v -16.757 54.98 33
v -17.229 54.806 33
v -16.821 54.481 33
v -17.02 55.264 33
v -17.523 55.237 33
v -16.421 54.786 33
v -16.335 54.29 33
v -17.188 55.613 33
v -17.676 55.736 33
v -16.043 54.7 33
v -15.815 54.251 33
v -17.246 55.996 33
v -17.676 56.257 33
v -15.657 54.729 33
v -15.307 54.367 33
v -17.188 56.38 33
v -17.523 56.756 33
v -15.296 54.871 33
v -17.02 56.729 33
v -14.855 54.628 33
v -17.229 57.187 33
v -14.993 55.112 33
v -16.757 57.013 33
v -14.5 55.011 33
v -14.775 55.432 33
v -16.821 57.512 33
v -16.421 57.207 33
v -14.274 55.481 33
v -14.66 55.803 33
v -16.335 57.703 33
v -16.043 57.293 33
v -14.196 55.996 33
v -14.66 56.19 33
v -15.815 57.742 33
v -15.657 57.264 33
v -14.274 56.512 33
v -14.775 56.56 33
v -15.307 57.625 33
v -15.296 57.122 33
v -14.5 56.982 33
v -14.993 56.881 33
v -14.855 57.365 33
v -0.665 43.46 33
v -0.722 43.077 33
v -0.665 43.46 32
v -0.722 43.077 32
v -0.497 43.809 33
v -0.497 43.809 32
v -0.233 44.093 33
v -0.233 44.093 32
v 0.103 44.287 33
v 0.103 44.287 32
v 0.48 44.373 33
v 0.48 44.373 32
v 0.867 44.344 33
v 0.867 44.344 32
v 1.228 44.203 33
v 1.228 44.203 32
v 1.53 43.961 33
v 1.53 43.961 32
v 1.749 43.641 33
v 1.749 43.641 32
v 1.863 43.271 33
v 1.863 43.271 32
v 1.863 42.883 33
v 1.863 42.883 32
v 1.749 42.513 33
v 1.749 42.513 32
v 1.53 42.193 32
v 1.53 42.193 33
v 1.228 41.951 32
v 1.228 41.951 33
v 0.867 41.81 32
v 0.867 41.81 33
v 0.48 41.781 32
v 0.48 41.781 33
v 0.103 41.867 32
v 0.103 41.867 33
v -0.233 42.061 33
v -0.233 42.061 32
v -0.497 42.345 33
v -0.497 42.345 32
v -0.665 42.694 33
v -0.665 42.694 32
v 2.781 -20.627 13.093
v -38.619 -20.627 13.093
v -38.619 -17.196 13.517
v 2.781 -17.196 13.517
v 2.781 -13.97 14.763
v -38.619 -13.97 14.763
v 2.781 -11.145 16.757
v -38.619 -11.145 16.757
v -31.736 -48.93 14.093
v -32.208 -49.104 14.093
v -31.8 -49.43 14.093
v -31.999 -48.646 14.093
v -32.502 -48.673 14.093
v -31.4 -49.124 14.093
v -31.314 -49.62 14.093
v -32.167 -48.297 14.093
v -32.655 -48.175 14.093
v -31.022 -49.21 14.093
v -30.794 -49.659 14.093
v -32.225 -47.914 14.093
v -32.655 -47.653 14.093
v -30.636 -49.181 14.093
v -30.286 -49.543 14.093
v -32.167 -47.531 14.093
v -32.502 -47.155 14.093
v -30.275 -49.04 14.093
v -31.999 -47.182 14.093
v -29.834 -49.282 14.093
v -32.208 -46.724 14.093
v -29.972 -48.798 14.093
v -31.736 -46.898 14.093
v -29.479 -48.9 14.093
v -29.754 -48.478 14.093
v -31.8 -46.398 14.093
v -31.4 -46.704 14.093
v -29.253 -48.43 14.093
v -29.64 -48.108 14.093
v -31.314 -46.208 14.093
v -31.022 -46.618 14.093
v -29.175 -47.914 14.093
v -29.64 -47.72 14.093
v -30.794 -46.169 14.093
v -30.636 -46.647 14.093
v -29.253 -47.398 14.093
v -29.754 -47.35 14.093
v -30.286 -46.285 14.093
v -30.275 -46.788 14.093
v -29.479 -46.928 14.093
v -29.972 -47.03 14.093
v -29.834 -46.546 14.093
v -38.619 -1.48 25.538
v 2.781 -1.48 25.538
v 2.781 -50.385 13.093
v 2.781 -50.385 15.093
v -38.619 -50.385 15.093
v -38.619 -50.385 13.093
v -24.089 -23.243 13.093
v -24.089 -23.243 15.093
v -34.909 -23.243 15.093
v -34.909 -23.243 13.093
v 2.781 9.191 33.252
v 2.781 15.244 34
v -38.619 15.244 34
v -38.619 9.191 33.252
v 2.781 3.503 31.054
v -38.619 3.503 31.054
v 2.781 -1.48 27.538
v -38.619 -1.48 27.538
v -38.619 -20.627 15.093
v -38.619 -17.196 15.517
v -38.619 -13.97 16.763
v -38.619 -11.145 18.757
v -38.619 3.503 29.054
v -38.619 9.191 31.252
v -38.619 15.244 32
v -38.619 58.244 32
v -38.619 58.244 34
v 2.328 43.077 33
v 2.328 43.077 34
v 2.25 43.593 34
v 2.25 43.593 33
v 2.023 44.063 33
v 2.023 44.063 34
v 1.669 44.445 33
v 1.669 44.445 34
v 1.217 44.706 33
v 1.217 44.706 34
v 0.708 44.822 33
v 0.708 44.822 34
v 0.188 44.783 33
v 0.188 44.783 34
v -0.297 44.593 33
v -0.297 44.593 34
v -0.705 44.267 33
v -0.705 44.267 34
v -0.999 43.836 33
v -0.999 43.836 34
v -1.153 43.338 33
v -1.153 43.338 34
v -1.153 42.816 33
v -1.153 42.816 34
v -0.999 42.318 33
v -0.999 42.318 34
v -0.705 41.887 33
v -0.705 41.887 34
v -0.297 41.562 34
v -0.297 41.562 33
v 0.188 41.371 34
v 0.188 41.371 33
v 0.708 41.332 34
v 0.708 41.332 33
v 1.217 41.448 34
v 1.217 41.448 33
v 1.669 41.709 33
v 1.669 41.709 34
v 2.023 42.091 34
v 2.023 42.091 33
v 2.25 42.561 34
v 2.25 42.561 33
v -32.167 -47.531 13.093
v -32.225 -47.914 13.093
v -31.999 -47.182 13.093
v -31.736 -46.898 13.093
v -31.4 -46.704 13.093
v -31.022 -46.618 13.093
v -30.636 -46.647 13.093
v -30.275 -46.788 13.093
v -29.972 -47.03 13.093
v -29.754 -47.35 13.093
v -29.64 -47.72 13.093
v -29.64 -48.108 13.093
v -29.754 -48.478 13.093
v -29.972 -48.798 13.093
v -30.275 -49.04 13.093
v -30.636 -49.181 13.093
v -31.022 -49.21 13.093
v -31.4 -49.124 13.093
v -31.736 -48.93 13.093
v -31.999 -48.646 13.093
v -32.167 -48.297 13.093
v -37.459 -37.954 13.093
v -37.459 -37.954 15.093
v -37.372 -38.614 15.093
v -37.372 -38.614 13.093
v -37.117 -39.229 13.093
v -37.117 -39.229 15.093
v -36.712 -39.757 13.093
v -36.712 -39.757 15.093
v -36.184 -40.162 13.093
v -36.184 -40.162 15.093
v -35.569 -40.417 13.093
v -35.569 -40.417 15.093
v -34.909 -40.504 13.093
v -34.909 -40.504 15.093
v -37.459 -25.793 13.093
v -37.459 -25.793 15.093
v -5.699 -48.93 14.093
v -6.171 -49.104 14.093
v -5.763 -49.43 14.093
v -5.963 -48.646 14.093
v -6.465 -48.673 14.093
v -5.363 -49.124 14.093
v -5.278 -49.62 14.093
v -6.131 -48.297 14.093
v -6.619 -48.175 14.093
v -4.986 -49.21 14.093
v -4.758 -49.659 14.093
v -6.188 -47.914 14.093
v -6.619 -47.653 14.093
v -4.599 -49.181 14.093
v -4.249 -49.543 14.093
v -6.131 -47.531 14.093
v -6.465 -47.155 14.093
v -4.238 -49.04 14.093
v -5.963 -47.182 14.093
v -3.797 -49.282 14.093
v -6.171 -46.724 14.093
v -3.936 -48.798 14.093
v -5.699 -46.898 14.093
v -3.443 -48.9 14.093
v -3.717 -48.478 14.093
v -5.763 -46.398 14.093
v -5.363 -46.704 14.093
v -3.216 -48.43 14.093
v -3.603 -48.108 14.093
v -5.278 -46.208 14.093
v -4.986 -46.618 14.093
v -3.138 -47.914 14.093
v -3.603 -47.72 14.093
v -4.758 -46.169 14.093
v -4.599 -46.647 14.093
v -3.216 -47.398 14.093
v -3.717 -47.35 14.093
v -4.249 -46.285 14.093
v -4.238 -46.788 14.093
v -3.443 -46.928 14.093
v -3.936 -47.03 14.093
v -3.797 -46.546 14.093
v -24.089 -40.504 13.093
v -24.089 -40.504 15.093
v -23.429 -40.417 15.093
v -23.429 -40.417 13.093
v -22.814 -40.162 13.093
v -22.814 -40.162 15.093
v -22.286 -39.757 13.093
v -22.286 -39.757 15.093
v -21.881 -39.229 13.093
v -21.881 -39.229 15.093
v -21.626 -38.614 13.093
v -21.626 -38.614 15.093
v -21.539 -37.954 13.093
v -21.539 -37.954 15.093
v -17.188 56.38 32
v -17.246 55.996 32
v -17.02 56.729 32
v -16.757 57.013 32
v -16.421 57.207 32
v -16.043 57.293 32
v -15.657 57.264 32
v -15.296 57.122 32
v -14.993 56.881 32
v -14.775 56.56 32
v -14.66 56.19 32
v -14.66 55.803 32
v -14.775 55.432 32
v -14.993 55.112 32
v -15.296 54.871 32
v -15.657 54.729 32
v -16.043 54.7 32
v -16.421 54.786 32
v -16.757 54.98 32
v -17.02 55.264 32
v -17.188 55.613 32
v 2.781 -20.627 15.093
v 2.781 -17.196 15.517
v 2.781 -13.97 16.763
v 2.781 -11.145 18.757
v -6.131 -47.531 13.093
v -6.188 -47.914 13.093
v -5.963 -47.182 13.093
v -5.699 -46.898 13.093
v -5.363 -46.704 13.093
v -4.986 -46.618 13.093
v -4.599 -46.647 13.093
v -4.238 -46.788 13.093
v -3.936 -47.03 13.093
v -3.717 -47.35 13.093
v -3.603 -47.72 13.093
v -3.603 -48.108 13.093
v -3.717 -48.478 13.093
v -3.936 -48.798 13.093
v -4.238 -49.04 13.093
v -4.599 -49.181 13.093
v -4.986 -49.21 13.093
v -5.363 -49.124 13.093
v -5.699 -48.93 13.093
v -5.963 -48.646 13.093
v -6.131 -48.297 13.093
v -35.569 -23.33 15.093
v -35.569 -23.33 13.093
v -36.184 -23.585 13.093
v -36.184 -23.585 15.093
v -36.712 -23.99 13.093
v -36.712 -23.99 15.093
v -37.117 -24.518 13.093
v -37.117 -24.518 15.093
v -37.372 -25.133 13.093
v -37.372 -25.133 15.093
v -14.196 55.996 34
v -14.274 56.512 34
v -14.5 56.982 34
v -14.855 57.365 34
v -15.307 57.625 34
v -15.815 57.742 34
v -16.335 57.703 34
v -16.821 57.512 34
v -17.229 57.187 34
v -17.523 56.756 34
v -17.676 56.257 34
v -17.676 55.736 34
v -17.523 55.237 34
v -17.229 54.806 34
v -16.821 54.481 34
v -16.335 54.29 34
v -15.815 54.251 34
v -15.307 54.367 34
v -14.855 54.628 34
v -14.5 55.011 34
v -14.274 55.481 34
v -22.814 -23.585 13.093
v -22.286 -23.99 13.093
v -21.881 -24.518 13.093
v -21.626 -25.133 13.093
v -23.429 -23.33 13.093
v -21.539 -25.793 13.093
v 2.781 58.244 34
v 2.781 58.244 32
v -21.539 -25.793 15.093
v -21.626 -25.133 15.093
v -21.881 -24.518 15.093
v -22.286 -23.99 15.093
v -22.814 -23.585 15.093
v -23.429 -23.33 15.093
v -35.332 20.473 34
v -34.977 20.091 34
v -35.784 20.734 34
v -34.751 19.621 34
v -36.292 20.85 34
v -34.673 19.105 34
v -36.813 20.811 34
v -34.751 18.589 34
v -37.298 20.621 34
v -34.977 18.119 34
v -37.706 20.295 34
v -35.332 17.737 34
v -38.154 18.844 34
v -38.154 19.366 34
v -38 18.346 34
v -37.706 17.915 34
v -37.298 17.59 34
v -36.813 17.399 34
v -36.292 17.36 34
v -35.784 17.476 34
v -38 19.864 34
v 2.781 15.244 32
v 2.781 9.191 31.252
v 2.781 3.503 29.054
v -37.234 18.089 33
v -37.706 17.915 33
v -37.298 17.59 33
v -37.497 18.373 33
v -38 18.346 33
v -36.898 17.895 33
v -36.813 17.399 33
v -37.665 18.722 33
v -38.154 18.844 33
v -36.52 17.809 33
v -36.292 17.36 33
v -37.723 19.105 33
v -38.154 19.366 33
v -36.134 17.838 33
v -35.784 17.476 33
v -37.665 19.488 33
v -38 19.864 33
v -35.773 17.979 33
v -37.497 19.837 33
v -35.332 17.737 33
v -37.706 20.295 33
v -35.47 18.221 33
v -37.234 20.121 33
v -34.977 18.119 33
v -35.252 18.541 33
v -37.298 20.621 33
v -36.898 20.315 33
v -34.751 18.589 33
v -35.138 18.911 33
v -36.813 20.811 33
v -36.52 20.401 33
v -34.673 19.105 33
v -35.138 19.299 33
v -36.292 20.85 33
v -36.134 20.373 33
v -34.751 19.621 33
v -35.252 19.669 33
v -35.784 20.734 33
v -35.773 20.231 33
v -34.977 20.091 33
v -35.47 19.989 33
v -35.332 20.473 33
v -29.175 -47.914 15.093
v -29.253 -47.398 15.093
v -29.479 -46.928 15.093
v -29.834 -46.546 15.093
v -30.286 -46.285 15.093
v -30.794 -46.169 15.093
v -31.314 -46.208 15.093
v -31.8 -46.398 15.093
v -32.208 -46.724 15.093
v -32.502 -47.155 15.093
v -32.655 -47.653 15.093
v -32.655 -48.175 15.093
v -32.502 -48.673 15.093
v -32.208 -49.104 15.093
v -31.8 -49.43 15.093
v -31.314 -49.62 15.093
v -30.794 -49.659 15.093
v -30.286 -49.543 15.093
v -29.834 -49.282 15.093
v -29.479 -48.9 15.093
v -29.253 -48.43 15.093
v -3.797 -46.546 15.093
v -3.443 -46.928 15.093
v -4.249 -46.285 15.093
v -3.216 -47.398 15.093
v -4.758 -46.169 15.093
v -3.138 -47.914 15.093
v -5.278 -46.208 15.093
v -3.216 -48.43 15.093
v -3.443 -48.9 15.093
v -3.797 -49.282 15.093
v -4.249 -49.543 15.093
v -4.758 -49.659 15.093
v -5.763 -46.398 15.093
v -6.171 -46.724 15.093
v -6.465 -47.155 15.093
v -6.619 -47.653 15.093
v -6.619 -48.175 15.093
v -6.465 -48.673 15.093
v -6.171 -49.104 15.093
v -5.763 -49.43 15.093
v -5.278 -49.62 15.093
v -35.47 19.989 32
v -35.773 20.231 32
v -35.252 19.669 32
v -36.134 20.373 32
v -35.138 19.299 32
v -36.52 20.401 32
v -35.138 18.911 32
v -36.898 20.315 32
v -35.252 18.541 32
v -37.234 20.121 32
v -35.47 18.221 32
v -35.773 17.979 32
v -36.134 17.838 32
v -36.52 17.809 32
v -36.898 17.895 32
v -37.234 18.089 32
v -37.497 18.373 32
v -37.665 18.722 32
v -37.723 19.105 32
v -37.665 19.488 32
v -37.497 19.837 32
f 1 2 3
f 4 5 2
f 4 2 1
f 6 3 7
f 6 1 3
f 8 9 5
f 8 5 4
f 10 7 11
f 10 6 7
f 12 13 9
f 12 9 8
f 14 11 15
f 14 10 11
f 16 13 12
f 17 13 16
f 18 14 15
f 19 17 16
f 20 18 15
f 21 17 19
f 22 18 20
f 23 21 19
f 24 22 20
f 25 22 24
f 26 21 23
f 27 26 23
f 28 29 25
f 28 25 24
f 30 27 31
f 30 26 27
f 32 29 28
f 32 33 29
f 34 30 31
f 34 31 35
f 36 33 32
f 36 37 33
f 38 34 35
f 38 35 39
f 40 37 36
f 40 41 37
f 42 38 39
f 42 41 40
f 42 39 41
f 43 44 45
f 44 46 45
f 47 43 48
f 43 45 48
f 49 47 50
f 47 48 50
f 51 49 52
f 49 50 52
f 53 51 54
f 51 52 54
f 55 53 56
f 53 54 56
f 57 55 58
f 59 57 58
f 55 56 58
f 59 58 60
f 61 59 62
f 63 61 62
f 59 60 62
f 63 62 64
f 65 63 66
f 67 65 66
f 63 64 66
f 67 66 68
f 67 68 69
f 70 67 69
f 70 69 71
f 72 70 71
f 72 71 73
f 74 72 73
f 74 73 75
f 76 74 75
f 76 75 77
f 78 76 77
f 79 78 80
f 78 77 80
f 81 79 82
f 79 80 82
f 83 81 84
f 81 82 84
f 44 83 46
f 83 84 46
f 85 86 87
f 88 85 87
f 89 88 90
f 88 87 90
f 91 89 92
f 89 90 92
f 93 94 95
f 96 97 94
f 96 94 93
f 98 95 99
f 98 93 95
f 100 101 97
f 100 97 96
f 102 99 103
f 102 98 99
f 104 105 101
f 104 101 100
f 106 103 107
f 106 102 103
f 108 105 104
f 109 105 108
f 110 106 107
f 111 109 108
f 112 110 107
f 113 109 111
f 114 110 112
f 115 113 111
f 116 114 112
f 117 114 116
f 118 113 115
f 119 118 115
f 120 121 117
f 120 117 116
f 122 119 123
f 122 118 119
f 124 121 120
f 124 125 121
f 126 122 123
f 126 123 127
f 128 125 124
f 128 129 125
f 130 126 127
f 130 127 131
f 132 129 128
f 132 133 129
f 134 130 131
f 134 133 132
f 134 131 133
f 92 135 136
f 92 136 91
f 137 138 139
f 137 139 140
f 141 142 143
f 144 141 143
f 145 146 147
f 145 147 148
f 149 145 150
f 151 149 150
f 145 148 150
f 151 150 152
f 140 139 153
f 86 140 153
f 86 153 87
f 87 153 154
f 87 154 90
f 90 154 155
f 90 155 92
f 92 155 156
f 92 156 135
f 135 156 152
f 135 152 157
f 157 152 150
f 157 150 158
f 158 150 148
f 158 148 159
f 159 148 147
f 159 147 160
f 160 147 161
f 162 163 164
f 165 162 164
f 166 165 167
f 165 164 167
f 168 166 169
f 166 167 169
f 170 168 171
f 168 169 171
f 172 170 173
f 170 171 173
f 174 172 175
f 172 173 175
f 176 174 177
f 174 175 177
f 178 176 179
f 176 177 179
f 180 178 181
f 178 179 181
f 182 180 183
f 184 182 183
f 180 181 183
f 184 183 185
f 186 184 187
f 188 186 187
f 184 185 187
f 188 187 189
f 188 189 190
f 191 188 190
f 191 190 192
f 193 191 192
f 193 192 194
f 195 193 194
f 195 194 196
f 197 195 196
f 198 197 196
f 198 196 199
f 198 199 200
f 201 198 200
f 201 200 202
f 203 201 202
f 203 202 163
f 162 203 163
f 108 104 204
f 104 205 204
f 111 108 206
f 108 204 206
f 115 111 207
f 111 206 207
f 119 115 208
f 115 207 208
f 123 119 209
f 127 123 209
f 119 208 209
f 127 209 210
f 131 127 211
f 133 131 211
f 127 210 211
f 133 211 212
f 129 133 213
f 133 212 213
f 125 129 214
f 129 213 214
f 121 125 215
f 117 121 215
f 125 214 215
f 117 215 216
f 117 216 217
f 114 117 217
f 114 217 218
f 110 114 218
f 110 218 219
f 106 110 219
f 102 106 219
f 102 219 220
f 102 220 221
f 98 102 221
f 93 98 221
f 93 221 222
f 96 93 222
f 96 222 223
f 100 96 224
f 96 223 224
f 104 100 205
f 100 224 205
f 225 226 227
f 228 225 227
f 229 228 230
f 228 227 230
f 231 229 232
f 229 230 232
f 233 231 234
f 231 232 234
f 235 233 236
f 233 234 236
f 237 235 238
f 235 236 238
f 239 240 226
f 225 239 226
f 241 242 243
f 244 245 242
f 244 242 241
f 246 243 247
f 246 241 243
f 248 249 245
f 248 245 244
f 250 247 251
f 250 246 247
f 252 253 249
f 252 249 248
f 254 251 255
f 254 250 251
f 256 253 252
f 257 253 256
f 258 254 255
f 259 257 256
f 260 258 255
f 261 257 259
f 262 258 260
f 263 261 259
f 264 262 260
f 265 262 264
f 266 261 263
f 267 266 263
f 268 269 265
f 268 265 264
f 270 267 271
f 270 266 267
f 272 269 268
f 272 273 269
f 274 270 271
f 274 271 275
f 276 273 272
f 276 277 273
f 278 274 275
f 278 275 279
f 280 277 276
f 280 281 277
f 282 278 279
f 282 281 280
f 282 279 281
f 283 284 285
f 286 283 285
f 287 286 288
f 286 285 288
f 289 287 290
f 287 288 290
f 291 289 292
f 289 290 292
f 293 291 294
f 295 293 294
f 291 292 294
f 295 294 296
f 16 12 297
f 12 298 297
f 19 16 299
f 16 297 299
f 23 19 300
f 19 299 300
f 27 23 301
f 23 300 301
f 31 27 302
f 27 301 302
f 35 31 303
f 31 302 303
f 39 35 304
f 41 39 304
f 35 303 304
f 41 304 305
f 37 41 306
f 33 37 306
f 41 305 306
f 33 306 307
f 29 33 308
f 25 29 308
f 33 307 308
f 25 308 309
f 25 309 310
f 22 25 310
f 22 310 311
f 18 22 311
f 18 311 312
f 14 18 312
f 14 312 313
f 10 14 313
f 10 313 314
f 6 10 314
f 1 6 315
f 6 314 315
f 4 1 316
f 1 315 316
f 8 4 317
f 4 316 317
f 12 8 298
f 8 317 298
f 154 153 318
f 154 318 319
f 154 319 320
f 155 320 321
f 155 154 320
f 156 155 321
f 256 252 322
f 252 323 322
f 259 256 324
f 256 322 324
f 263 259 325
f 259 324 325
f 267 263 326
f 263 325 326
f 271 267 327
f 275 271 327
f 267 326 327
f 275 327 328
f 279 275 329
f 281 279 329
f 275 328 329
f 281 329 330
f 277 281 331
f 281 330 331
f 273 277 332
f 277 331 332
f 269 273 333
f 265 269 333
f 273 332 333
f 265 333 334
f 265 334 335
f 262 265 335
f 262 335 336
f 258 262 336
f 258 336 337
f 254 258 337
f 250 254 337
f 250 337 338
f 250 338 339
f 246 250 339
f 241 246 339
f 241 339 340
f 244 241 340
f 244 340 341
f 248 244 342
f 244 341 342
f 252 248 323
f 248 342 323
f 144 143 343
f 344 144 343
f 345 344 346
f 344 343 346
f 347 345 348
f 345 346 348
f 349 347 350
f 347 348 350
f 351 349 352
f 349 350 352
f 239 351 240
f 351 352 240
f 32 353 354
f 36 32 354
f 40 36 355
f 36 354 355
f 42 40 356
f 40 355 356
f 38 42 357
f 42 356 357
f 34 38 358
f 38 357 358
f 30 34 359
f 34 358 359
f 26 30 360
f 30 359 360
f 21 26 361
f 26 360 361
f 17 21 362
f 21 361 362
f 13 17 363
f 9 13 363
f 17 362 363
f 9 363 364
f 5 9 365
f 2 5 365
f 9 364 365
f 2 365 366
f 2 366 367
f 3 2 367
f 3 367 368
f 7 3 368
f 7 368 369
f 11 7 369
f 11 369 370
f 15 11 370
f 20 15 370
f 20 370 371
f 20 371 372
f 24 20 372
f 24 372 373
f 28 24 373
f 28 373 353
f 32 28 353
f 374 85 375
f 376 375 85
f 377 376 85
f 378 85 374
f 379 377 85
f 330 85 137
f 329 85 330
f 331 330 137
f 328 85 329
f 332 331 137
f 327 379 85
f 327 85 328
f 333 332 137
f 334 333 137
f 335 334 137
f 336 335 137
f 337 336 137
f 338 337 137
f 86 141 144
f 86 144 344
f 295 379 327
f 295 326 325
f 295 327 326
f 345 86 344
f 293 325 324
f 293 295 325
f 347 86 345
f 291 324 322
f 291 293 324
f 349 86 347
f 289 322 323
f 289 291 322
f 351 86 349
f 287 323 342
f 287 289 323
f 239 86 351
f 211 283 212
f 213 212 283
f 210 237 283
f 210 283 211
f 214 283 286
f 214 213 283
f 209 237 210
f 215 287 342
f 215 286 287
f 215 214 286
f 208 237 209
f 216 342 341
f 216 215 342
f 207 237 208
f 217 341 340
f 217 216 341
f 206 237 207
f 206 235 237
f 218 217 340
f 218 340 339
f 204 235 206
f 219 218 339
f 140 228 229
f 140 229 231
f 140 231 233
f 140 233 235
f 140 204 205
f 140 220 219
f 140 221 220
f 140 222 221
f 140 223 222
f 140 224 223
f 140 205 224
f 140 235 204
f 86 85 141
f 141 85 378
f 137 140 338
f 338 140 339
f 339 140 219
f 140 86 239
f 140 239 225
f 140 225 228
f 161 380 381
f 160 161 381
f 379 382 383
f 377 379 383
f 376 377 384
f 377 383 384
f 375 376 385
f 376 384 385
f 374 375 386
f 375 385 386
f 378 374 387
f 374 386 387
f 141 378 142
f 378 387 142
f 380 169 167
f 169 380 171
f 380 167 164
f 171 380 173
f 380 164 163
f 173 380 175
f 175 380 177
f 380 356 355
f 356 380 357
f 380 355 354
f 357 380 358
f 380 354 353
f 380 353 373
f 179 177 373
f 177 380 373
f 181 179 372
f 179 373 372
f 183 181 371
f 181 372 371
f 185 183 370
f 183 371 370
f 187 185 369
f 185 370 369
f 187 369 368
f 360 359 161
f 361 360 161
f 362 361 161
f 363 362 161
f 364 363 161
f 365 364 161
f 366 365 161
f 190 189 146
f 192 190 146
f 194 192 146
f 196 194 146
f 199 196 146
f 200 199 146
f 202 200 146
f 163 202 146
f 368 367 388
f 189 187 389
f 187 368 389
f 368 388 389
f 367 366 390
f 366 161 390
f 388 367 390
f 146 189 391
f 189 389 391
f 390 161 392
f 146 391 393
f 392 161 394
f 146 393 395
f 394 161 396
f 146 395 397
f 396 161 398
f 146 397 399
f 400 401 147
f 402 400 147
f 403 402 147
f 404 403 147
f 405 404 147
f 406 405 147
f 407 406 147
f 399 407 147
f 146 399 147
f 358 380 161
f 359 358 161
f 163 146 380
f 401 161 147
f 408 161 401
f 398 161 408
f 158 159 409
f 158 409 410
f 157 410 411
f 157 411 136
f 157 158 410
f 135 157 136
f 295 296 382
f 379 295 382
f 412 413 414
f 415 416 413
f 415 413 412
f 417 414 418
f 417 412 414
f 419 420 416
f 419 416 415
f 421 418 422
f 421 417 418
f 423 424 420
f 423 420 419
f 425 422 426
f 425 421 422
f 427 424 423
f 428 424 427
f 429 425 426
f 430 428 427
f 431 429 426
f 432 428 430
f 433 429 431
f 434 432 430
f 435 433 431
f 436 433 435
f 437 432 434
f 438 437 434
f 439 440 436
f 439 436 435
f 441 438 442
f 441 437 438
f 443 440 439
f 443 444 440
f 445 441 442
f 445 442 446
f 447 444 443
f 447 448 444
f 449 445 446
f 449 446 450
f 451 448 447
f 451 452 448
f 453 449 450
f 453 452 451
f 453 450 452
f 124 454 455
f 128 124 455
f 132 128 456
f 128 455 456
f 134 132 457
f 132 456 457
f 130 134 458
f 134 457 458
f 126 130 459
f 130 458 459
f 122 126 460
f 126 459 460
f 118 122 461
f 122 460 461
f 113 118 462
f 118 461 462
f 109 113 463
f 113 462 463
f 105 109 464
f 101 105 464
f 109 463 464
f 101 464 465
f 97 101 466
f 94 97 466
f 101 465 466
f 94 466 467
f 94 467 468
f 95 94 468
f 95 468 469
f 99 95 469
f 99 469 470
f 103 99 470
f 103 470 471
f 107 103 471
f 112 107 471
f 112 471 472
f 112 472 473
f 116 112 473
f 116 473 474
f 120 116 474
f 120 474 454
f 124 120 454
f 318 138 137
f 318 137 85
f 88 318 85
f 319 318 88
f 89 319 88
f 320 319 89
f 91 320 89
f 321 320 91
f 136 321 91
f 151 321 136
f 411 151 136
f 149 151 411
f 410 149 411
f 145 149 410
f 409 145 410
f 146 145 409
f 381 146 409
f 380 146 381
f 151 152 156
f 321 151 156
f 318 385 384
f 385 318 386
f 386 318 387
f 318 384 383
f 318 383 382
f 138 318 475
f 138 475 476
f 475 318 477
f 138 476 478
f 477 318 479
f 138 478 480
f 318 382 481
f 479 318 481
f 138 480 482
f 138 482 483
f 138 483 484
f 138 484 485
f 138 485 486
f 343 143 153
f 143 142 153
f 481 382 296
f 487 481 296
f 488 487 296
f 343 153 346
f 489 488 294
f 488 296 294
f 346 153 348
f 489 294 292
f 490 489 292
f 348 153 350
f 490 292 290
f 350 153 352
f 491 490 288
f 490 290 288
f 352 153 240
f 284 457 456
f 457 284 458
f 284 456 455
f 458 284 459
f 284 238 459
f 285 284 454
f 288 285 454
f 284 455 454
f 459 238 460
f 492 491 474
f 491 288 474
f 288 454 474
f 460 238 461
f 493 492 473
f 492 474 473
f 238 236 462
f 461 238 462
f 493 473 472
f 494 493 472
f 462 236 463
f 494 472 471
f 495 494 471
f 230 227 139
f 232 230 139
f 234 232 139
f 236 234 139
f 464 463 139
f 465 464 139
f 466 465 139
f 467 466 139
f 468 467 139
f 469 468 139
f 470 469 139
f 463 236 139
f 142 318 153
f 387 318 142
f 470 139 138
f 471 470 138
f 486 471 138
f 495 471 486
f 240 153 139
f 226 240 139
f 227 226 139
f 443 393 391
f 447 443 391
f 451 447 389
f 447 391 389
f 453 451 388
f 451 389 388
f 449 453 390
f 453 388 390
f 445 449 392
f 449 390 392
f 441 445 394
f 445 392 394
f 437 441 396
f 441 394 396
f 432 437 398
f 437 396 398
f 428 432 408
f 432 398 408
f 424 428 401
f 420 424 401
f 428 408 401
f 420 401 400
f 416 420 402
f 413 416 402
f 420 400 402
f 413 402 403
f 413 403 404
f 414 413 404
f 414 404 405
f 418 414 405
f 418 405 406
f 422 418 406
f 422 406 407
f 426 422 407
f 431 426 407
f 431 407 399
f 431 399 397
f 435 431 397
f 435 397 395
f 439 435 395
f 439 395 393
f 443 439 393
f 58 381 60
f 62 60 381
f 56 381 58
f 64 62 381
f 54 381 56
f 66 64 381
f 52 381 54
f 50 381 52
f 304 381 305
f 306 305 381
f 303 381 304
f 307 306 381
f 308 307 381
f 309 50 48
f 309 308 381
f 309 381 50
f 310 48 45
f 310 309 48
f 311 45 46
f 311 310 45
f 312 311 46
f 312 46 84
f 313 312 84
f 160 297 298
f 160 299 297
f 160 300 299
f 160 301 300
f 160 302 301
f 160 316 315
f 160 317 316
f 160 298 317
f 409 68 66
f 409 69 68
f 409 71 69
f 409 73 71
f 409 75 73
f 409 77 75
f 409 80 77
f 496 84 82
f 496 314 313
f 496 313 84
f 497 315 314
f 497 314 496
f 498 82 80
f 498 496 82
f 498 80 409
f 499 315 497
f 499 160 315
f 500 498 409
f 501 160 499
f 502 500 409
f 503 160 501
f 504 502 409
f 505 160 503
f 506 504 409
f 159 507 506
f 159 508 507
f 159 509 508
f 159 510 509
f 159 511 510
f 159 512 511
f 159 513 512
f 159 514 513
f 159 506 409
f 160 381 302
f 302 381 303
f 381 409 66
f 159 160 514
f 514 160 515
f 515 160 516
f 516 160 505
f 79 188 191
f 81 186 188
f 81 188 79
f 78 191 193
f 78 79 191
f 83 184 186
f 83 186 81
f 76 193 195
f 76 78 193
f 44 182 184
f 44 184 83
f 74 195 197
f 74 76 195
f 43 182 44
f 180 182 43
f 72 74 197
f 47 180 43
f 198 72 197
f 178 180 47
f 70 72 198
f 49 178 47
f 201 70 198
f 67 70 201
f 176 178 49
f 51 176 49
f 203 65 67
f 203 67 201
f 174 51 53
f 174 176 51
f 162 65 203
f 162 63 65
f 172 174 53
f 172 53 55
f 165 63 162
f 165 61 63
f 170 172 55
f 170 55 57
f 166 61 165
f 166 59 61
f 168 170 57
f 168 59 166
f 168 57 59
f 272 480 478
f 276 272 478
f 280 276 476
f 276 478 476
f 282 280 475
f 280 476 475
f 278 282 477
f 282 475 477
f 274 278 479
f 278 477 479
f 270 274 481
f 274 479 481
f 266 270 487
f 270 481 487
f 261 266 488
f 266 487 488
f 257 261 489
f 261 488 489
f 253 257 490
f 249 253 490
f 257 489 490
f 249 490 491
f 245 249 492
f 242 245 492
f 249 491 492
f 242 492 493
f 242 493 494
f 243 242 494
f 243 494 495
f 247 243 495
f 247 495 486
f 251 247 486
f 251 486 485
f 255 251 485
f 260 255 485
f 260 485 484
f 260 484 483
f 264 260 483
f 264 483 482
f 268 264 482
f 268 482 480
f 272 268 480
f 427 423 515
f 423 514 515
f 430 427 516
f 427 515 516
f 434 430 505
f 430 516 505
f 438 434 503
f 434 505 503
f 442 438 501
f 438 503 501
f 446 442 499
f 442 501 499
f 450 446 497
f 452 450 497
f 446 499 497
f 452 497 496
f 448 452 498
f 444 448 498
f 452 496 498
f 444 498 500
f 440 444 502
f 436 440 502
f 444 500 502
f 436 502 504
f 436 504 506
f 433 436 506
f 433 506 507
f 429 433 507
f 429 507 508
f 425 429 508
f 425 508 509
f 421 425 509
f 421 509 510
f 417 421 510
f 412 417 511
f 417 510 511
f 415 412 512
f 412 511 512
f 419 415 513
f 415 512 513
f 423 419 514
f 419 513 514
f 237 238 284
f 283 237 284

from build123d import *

# Parameters (mm, degrees)
PAD041_START        = 0.3
PAD041_DEPTH        = 41.4
HOLE006_D           = 2.6
HOLE006_DEPTH       = 3
HOLE006_CBORE_D     = 3.5
HOLE006_CBORE_DEPTH = 1
HOLE006_TIPS_R      = 1.3
POCKET012_DEPTH     = 3
HOLE007_D           = 2.6
HOLE007_DEPTH       = 4
HOLE007_CBORE_D     = 3.5
HOLE007_CBORE_DEPTH = 1


with BuildPart() as part:
    # Sketch063 (on Face1 of CopyPocket007) → Pad041 (new body)
    with BuildSketch(Plane.YZ.offset(-38.919239).offset(PAD041_START)):
        with BuildLine():
            Line((58.243801, 33.999995), (15.243801, 33.999995))
            ThreePointArc((15.243801, 33.999995), (6.279309, 32.328219), (-1.480028, 27.53764))
            Line((-1.480028, 27.53764), (-11.145172, 18.757006))
            ThreePointArc((-20.627205, 15.092996), (-15.54454, 16.040855), (-11.145172, 18.757006))
            Line((-20.627205, 15.092996), (-50.3848, 15.092996))
            Line((-50.3848, 15.092996), (-50.3848, 13.092994))
            Line((-20.627205, 13.092994), (-50.3848, 13.092994))
            ThreePointArc((-20.627205, 13.092994), (-15.54454, 14.040853), (-11.14517, 16.757003))
            Line((-1.480025, 25.537638), (-11.14517, 16.757003))
            ThreePointArc((15.243801, 31.999992), (6.27931, 30.328217), (-1.480025, 25.537638))
            Line((58.243801, 31.999992), (15.243801, 31.999992))
            Line((58.243801, 33.999995), (58.243801, 31.999992))
        make_face()
    extrude(amount=PAD041_DEPTH)

    # Hole006
    with Locations(Plane.XY.offset(33.999995)):
        with Locations((-36.423248, 19.105118), (0.57751, 43.077087), (-15.945976, 55.996437)):
            CounterBoreHole(HOLE006_D / 2, HOLE006_CBORE_D / 2, HOLE006_CBORE_DEPTH, depth=HOLE006_DEPTH)

    # Hole006 tips → Hole006 tip 1 section 0
    with BuildSketch(Plane.XY.offset(30.999995), mode=Mode.PRIVATE) as hole006_tip_1_s0:
        with Locations((-36.423248, 19.105118)):
            Circle(HOLE006_TIPS_R)
    loft([hole006_tip_1_s0.sketch, Vertex(-36.423248, 19.105118, 30.218876)], mode=Mode.SUBTRACT)

    # Hole006 tips → Hole006 tip 2 section 0
    with BuildSketch(Plane.XY.offset(30.999995), mode=Mode.PRIVATE) as hole006_tip_2_s0:
        with Locations((0.57751, 43.077087)):
            Circle(HOLE006_TIPS_R)
    loft([hole006_tip_2_s0.sketch, Vertex(0.57751, 43.077087, 30.218876)], mode=Mode.SUBTRACT)

    # Hole006 tips → Hole006 tip 3 section 0
    with BuildSketch(Plane.XY.offset(30.999995), mode=Mode.PRIVATE) as hole006_tip_3_s0:
        with Locations((-15.945976, 55.996437)):
            Circle(HOLE006_TIPS_R)
    loft([hole006_tip_3_s0.sketch, Vertex(-15.945976, 55.996437, 30.218876)], mode=Mode.SUBTRACT)

    # Sketch065 (on Face12 of Hole006) → Pocket012 (cut)
    with BuildSketch(Plane.XY.offset(15.092996)):
        with BuildLine():
            Line((-37.458851, -25.793337), (-37.458851, -37.953597))
            ThreePointArc((-37.458851, -37.953597), (-36.711973, -39.756719), (-34.908851, -40.503597))
            Line((-34.908851, -40.503597), (-24.089139, -40.503597))
            ThreePointArc((-24.089139, -40.503597), (-22.286017, -39.756719), (-21.539139, -37.953597))
            Line((-21.539139, -37.953597), (-21.539139, -25.793337))
            ThreePointArc((-21.539139, -25.793337), (-22.286017, -23.990215), (-24.089139, -23.243337))
            Line((-24.089139, -23.243337), (-34.908851, -23.243337))
            ThreePointArc((-34.908851, -23.243337), (-36.711973, -23.990215), (-37.458851, -25.793337))
        make_face()
    extrude(amount=-POCKET012_DEPTH, mode=Mode.SUBTRACT)

    # Hole007
    with Locations(Plane.XY.offset(15.092996)):
        with Locations((-4.888495, -47.913956), (-30.924999, -47.913956)):
            CounterBoreHole(HOLE007_D / 2, HOLE007_CBORE_D / 2, HOLE007_CBORE_DEPTH, depth=HOLE007_DEPTH)


solid = part.part
